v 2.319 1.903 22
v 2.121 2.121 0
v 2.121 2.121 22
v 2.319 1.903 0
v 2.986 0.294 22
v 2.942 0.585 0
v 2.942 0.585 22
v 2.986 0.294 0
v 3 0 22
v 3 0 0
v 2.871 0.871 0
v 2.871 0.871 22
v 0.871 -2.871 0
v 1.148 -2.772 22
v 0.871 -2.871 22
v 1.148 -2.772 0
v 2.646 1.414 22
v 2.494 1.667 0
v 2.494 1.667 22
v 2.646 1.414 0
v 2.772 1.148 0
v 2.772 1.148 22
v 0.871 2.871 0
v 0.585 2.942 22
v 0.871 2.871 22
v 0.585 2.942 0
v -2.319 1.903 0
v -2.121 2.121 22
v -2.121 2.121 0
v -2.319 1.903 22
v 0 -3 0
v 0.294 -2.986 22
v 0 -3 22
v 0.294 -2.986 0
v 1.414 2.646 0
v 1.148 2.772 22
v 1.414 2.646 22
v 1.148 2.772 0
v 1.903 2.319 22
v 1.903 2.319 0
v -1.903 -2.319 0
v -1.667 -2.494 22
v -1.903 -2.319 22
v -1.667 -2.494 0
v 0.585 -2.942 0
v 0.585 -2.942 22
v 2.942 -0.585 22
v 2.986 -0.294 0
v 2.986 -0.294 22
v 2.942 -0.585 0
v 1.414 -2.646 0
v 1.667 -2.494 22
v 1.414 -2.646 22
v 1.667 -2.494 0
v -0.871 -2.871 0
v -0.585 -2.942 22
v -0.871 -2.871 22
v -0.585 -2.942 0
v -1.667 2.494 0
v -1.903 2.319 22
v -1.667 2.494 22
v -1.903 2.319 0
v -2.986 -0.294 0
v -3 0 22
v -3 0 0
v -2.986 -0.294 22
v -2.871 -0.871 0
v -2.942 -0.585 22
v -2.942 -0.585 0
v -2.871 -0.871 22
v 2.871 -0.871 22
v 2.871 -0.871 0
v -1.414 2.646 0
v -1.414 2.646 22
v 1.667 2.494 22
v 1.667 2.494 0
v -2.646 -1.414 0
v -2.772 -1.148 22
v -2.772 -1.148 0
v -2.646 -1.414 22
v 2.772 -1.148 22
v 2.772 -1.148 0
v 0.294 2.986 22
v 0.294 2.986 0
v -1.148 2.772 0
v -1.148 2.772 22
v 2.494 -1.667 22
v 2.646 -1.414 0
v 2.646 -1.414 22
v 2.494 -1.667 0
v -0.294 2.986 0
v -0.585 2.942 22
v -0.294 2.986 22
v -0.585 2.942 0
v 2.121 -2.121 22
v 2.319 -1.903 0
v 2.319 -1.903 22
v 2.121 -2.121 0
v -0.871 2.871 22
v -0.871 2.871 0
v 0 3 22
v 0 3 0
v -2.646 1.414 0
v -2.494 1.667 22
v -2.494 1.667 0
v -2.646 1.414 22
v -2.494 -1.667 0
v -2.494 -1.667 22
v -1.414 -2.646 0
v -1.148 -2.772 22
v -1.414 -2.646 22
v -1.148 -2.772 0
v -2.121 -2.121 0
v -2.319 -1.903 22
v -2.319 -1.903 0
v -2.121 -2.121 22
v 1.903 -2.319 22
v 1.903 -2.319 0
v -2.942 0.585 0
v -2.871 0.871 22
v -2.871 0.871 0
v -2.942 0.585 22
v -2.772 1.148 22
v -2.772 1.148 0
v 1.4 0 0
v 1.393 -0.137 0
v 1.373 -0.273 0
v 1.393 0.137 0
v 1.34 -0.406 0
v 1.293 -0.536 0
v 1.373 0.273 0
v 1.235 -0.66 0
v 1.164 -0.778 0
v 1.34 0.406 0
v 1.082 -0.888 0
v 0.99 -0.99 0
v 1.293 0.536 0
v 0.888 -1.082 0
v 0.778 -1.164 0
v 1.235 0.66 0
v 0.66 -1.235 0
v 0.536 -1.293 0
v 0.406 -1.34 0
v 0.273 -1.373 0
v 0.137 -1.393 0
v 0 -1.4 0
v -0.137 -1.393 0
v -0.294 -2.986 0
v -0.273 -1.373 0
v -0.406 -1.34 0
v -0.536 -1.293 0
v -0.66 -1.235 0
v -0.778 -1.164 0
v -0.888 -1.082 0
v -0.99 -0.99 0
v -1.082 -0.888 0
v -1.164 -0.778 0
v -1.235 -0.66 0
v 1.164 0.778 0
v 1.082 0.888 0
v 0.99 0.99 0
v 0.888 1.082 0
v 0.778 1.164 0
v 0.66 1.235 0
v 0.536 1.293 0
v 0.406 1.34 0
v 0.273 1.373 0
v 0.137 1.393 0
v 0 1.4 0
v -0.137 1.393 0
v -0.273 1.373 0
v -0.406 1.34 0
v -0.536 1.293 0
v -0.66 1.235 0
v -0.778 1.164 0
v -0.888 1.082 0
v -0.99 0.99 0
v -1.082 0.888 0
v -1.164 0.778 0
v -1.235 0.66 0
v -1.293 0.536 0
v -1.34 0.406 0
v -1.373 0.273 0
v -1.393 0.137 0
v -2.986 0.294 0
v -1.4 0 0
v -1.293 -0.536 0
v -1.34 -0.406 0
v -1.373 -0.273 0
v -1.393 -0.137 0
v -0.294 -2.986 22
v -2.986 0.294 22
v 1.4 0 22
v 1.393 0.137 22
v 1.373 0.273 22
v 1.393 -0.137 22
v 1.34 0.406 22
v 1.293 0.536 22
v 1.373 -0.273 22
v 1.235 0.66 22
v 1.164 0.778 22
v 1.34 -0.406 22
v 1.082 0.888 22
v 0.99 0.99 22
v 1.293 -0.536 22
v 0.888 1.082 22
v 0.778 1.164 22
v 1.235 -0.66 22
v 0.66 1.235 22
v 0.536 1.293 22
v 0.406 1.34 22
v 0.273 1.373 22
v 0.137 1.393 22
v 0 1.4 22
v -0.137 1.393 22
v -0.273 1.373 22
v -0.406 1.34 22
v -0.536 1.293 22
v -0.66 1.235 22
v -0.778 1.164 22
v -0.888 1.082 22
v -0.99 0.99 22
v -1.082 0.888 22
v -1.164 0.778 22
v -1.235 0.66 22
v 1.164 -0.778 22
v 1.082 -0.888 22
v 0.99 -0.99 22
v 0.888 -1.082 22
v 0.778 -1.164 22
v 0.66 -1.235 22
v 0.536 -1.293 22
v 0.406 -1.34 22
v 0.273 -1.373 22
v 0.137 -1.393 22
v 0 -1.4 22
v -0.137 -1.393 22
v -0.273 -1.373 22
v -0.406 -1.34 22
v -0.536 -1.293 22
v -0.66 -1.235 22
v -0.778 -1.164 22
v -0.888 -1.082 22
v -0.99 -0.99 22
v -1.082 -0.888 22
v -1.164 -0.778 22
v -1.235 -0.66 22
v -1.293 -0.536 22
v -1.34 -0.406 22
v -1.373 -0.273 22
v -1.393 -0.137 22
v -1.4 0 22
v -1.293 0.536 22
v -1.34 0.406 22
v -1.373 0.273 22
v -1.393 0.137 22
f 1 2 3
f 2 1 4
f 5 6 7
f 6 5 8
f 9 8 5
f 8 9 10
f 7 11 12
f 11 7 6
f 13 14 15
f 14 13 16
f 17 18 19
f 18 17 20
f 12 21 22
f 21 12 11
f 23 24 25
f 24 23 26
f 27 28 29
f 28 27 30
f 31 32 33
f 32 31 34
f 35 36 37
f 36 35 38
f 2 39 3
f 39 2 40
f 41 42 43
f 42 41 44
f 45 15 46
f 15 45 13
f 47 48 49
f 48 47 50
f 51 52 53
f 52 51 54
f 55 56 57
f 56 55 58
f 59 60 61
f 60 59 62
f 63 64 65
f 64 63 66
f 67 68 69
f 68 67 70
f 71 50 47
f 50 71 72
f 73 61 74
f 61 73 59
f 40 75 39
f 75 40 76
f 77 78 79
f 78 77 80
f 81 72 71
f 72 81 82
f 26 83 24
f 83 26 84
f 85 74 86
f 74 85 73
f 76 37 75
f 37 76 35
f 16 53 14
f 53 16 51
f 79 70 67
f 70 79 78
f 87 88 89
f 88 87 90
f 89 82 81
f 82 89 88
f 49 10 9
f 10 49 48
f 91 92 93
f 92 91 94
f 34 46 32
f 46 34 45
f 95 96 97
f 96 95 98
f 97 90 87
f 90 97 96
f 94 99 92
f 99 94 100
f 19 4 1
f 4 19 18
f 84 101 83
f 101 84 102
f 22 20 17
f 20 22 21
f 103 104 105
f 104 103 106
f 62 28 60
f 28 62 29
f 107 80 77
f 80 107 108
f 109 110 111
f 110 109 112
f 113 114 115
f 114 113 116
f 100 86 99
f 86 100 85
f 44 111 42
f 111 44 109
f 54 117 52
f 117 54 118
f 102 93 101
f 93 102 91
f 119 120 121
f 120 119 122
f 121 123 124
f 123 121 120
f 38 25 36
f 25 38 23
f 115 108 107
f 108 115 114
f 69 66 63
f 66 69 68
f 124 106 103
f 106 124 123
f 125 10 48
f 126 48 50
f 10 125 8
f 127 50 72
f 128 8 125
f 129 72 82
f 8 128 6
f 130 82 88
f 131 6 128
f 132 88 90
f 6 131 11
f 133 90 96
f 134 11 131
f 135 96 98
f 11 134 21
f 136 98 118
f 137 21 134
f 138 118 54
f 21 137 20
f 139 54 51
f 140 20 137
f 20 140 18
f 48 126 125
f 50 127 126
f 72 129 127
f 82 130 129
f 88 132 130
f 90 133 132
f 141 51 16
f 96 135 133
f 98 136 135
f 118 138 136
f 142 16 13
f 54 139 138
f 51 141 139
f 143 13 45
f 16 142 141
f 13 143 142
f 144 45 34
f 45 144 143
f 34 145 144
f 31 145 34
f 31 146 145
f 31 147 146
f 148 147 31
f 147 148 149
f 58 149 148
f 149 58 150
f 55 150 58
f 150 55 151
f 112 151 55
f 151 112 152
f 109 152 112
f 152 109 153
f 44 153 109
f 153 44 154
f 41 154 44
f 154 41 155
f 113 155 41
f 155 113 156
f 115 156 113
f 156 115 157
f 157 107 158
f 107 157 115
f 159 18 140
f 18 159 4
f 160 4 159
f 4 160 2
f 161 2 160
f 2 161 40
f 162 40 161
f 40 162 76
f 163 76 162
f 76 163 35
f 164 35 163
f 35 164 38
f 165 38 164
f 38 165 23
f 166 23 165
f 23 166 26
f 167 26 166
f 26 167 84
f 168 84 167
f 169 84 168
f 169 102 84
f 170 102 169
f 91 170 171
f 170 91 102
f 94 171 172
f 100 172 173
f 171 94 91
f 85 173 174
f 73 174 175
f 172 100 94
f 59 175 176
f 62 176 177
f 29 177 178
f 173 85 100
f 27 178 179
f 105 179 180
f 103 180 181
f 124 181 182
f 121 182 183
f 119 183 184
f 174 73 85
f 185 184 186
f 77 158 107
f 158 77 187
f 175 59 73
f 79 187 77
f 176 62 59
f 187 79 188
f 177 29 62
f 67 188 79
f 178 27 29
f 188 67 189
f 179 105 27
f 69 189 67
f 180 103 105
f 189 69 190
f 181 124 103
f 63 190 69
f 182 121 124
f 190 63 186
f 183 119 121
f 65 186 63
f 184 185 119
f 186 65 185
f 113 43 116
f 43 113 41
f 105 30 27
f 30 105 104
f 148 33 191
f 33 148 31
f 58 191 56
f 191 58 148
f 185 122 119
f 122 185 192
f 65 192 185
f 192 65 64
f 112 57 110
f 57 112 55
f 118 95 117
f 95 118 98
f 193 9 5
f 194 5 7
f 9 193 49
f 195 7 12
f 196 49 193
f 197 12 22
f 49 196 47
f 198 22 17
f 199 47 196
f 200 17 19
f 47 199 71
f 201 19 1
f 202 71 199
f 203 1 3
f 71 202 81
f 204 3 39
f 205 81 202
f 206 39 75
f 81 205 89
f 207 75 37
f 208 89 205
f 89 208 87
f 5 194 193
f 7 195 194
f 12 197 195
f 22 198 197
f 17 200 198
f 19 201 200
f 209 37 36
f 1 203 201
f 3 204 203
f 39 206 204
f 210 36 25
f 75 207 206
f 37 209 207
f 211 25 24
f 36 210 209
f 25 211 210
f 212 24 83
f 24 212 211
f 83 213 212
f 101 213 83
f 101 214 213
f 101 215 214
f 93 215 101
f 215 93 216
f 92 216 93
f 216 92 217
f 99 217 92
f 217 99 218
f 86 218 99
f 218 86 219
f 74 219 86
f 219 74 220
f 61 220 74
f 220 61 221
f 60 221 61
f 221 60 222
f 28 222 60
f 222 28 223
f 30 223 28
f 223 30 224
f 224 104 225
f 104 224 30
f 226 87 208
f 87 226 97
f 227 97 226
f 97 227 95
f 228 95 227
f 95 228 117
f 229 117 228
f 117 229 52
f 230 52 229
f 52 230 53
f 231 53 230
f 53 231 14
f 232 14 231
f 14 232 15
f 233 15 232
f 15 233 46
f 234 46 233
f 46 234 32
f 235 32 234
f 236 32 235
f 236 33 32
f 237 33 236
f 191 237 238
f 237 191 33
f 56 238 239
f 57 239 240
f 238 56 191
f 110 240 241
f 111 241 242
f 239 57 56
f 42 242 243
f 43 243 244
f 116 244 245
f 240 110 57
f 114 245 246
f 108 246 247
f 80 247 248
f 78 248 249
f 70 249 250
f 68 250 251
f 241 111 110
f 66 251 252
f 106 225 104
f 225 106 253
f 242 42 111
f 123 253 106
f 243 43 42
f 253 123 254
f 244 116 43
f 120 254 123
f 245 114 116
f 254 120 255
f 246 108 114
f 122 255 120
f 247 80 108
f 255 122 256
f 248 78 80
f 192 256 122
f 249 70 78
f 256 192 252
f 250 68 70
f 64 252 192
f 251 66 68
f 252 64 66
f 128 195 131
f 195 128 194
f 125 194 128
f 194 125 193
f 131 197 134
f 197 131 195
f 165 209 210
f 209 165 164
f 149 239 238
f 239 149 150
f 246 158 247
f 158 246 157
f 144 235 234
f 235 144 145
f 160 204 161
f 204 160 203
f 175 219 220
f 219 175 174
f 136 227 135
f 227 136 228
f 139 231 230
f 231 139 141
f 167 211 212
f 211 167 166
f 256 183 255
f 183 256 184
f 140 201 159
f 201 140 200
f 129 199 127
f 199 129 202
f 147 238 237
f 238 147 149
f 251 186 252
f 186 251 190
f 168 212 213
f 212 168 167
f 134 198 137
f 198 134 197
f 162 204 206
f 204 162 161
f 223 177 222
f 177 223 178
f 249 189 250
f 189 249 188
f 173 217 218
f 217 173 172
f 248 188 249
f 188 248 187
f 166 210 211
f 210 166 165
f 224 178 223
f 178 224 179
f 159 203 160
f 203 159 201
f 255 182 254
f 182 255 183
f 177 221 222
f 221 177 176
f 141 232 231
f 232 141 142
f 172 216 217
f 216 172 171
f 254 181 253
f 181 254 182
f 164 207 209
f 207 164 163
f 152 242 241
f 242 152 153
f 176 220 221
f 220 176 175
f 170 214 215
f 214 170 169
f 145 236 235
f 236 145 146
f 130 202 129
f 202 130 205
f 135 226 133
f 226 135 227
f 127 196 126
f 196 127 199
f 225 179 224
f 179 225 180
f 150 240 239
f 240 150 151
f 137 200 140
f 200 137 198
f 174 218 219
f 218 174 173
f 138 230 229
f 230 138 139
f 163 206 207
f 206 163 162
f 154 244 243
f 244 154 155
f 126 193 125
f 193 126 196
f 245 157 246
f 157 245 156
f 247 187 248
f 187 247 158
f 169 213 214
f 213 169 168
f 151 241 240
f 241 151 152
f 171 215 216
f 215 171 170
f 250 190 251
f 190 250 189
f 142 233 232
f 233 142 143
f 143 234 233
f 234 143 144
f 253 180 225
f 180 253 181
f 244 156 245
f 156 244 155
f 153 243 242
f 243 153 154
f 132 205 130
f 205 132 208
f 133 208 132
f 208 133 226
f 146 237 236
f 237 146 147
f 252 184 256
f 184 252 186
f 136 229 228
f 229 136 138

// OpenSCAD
//
// standoff-6x22(2.8)-2-20260301B.scad
//
// Cylinder with through hole
//

D_outer = 6.0; // 外径 (mm)
L       = 22;  // 長さ (mm)
D_hole  = 2.8; // 穴径 (mm)

$fn = 64;      // 円の滑らかさ

difference() {
    // 外側の円柱
    cylinder(d = D_outer, h = L);

    // 中心に貫通穴
    // 少し長めにして確実に貫通させる
    translate([0, 0, -1])
        cylinder(d = D_hole, h = L + 2);
}
